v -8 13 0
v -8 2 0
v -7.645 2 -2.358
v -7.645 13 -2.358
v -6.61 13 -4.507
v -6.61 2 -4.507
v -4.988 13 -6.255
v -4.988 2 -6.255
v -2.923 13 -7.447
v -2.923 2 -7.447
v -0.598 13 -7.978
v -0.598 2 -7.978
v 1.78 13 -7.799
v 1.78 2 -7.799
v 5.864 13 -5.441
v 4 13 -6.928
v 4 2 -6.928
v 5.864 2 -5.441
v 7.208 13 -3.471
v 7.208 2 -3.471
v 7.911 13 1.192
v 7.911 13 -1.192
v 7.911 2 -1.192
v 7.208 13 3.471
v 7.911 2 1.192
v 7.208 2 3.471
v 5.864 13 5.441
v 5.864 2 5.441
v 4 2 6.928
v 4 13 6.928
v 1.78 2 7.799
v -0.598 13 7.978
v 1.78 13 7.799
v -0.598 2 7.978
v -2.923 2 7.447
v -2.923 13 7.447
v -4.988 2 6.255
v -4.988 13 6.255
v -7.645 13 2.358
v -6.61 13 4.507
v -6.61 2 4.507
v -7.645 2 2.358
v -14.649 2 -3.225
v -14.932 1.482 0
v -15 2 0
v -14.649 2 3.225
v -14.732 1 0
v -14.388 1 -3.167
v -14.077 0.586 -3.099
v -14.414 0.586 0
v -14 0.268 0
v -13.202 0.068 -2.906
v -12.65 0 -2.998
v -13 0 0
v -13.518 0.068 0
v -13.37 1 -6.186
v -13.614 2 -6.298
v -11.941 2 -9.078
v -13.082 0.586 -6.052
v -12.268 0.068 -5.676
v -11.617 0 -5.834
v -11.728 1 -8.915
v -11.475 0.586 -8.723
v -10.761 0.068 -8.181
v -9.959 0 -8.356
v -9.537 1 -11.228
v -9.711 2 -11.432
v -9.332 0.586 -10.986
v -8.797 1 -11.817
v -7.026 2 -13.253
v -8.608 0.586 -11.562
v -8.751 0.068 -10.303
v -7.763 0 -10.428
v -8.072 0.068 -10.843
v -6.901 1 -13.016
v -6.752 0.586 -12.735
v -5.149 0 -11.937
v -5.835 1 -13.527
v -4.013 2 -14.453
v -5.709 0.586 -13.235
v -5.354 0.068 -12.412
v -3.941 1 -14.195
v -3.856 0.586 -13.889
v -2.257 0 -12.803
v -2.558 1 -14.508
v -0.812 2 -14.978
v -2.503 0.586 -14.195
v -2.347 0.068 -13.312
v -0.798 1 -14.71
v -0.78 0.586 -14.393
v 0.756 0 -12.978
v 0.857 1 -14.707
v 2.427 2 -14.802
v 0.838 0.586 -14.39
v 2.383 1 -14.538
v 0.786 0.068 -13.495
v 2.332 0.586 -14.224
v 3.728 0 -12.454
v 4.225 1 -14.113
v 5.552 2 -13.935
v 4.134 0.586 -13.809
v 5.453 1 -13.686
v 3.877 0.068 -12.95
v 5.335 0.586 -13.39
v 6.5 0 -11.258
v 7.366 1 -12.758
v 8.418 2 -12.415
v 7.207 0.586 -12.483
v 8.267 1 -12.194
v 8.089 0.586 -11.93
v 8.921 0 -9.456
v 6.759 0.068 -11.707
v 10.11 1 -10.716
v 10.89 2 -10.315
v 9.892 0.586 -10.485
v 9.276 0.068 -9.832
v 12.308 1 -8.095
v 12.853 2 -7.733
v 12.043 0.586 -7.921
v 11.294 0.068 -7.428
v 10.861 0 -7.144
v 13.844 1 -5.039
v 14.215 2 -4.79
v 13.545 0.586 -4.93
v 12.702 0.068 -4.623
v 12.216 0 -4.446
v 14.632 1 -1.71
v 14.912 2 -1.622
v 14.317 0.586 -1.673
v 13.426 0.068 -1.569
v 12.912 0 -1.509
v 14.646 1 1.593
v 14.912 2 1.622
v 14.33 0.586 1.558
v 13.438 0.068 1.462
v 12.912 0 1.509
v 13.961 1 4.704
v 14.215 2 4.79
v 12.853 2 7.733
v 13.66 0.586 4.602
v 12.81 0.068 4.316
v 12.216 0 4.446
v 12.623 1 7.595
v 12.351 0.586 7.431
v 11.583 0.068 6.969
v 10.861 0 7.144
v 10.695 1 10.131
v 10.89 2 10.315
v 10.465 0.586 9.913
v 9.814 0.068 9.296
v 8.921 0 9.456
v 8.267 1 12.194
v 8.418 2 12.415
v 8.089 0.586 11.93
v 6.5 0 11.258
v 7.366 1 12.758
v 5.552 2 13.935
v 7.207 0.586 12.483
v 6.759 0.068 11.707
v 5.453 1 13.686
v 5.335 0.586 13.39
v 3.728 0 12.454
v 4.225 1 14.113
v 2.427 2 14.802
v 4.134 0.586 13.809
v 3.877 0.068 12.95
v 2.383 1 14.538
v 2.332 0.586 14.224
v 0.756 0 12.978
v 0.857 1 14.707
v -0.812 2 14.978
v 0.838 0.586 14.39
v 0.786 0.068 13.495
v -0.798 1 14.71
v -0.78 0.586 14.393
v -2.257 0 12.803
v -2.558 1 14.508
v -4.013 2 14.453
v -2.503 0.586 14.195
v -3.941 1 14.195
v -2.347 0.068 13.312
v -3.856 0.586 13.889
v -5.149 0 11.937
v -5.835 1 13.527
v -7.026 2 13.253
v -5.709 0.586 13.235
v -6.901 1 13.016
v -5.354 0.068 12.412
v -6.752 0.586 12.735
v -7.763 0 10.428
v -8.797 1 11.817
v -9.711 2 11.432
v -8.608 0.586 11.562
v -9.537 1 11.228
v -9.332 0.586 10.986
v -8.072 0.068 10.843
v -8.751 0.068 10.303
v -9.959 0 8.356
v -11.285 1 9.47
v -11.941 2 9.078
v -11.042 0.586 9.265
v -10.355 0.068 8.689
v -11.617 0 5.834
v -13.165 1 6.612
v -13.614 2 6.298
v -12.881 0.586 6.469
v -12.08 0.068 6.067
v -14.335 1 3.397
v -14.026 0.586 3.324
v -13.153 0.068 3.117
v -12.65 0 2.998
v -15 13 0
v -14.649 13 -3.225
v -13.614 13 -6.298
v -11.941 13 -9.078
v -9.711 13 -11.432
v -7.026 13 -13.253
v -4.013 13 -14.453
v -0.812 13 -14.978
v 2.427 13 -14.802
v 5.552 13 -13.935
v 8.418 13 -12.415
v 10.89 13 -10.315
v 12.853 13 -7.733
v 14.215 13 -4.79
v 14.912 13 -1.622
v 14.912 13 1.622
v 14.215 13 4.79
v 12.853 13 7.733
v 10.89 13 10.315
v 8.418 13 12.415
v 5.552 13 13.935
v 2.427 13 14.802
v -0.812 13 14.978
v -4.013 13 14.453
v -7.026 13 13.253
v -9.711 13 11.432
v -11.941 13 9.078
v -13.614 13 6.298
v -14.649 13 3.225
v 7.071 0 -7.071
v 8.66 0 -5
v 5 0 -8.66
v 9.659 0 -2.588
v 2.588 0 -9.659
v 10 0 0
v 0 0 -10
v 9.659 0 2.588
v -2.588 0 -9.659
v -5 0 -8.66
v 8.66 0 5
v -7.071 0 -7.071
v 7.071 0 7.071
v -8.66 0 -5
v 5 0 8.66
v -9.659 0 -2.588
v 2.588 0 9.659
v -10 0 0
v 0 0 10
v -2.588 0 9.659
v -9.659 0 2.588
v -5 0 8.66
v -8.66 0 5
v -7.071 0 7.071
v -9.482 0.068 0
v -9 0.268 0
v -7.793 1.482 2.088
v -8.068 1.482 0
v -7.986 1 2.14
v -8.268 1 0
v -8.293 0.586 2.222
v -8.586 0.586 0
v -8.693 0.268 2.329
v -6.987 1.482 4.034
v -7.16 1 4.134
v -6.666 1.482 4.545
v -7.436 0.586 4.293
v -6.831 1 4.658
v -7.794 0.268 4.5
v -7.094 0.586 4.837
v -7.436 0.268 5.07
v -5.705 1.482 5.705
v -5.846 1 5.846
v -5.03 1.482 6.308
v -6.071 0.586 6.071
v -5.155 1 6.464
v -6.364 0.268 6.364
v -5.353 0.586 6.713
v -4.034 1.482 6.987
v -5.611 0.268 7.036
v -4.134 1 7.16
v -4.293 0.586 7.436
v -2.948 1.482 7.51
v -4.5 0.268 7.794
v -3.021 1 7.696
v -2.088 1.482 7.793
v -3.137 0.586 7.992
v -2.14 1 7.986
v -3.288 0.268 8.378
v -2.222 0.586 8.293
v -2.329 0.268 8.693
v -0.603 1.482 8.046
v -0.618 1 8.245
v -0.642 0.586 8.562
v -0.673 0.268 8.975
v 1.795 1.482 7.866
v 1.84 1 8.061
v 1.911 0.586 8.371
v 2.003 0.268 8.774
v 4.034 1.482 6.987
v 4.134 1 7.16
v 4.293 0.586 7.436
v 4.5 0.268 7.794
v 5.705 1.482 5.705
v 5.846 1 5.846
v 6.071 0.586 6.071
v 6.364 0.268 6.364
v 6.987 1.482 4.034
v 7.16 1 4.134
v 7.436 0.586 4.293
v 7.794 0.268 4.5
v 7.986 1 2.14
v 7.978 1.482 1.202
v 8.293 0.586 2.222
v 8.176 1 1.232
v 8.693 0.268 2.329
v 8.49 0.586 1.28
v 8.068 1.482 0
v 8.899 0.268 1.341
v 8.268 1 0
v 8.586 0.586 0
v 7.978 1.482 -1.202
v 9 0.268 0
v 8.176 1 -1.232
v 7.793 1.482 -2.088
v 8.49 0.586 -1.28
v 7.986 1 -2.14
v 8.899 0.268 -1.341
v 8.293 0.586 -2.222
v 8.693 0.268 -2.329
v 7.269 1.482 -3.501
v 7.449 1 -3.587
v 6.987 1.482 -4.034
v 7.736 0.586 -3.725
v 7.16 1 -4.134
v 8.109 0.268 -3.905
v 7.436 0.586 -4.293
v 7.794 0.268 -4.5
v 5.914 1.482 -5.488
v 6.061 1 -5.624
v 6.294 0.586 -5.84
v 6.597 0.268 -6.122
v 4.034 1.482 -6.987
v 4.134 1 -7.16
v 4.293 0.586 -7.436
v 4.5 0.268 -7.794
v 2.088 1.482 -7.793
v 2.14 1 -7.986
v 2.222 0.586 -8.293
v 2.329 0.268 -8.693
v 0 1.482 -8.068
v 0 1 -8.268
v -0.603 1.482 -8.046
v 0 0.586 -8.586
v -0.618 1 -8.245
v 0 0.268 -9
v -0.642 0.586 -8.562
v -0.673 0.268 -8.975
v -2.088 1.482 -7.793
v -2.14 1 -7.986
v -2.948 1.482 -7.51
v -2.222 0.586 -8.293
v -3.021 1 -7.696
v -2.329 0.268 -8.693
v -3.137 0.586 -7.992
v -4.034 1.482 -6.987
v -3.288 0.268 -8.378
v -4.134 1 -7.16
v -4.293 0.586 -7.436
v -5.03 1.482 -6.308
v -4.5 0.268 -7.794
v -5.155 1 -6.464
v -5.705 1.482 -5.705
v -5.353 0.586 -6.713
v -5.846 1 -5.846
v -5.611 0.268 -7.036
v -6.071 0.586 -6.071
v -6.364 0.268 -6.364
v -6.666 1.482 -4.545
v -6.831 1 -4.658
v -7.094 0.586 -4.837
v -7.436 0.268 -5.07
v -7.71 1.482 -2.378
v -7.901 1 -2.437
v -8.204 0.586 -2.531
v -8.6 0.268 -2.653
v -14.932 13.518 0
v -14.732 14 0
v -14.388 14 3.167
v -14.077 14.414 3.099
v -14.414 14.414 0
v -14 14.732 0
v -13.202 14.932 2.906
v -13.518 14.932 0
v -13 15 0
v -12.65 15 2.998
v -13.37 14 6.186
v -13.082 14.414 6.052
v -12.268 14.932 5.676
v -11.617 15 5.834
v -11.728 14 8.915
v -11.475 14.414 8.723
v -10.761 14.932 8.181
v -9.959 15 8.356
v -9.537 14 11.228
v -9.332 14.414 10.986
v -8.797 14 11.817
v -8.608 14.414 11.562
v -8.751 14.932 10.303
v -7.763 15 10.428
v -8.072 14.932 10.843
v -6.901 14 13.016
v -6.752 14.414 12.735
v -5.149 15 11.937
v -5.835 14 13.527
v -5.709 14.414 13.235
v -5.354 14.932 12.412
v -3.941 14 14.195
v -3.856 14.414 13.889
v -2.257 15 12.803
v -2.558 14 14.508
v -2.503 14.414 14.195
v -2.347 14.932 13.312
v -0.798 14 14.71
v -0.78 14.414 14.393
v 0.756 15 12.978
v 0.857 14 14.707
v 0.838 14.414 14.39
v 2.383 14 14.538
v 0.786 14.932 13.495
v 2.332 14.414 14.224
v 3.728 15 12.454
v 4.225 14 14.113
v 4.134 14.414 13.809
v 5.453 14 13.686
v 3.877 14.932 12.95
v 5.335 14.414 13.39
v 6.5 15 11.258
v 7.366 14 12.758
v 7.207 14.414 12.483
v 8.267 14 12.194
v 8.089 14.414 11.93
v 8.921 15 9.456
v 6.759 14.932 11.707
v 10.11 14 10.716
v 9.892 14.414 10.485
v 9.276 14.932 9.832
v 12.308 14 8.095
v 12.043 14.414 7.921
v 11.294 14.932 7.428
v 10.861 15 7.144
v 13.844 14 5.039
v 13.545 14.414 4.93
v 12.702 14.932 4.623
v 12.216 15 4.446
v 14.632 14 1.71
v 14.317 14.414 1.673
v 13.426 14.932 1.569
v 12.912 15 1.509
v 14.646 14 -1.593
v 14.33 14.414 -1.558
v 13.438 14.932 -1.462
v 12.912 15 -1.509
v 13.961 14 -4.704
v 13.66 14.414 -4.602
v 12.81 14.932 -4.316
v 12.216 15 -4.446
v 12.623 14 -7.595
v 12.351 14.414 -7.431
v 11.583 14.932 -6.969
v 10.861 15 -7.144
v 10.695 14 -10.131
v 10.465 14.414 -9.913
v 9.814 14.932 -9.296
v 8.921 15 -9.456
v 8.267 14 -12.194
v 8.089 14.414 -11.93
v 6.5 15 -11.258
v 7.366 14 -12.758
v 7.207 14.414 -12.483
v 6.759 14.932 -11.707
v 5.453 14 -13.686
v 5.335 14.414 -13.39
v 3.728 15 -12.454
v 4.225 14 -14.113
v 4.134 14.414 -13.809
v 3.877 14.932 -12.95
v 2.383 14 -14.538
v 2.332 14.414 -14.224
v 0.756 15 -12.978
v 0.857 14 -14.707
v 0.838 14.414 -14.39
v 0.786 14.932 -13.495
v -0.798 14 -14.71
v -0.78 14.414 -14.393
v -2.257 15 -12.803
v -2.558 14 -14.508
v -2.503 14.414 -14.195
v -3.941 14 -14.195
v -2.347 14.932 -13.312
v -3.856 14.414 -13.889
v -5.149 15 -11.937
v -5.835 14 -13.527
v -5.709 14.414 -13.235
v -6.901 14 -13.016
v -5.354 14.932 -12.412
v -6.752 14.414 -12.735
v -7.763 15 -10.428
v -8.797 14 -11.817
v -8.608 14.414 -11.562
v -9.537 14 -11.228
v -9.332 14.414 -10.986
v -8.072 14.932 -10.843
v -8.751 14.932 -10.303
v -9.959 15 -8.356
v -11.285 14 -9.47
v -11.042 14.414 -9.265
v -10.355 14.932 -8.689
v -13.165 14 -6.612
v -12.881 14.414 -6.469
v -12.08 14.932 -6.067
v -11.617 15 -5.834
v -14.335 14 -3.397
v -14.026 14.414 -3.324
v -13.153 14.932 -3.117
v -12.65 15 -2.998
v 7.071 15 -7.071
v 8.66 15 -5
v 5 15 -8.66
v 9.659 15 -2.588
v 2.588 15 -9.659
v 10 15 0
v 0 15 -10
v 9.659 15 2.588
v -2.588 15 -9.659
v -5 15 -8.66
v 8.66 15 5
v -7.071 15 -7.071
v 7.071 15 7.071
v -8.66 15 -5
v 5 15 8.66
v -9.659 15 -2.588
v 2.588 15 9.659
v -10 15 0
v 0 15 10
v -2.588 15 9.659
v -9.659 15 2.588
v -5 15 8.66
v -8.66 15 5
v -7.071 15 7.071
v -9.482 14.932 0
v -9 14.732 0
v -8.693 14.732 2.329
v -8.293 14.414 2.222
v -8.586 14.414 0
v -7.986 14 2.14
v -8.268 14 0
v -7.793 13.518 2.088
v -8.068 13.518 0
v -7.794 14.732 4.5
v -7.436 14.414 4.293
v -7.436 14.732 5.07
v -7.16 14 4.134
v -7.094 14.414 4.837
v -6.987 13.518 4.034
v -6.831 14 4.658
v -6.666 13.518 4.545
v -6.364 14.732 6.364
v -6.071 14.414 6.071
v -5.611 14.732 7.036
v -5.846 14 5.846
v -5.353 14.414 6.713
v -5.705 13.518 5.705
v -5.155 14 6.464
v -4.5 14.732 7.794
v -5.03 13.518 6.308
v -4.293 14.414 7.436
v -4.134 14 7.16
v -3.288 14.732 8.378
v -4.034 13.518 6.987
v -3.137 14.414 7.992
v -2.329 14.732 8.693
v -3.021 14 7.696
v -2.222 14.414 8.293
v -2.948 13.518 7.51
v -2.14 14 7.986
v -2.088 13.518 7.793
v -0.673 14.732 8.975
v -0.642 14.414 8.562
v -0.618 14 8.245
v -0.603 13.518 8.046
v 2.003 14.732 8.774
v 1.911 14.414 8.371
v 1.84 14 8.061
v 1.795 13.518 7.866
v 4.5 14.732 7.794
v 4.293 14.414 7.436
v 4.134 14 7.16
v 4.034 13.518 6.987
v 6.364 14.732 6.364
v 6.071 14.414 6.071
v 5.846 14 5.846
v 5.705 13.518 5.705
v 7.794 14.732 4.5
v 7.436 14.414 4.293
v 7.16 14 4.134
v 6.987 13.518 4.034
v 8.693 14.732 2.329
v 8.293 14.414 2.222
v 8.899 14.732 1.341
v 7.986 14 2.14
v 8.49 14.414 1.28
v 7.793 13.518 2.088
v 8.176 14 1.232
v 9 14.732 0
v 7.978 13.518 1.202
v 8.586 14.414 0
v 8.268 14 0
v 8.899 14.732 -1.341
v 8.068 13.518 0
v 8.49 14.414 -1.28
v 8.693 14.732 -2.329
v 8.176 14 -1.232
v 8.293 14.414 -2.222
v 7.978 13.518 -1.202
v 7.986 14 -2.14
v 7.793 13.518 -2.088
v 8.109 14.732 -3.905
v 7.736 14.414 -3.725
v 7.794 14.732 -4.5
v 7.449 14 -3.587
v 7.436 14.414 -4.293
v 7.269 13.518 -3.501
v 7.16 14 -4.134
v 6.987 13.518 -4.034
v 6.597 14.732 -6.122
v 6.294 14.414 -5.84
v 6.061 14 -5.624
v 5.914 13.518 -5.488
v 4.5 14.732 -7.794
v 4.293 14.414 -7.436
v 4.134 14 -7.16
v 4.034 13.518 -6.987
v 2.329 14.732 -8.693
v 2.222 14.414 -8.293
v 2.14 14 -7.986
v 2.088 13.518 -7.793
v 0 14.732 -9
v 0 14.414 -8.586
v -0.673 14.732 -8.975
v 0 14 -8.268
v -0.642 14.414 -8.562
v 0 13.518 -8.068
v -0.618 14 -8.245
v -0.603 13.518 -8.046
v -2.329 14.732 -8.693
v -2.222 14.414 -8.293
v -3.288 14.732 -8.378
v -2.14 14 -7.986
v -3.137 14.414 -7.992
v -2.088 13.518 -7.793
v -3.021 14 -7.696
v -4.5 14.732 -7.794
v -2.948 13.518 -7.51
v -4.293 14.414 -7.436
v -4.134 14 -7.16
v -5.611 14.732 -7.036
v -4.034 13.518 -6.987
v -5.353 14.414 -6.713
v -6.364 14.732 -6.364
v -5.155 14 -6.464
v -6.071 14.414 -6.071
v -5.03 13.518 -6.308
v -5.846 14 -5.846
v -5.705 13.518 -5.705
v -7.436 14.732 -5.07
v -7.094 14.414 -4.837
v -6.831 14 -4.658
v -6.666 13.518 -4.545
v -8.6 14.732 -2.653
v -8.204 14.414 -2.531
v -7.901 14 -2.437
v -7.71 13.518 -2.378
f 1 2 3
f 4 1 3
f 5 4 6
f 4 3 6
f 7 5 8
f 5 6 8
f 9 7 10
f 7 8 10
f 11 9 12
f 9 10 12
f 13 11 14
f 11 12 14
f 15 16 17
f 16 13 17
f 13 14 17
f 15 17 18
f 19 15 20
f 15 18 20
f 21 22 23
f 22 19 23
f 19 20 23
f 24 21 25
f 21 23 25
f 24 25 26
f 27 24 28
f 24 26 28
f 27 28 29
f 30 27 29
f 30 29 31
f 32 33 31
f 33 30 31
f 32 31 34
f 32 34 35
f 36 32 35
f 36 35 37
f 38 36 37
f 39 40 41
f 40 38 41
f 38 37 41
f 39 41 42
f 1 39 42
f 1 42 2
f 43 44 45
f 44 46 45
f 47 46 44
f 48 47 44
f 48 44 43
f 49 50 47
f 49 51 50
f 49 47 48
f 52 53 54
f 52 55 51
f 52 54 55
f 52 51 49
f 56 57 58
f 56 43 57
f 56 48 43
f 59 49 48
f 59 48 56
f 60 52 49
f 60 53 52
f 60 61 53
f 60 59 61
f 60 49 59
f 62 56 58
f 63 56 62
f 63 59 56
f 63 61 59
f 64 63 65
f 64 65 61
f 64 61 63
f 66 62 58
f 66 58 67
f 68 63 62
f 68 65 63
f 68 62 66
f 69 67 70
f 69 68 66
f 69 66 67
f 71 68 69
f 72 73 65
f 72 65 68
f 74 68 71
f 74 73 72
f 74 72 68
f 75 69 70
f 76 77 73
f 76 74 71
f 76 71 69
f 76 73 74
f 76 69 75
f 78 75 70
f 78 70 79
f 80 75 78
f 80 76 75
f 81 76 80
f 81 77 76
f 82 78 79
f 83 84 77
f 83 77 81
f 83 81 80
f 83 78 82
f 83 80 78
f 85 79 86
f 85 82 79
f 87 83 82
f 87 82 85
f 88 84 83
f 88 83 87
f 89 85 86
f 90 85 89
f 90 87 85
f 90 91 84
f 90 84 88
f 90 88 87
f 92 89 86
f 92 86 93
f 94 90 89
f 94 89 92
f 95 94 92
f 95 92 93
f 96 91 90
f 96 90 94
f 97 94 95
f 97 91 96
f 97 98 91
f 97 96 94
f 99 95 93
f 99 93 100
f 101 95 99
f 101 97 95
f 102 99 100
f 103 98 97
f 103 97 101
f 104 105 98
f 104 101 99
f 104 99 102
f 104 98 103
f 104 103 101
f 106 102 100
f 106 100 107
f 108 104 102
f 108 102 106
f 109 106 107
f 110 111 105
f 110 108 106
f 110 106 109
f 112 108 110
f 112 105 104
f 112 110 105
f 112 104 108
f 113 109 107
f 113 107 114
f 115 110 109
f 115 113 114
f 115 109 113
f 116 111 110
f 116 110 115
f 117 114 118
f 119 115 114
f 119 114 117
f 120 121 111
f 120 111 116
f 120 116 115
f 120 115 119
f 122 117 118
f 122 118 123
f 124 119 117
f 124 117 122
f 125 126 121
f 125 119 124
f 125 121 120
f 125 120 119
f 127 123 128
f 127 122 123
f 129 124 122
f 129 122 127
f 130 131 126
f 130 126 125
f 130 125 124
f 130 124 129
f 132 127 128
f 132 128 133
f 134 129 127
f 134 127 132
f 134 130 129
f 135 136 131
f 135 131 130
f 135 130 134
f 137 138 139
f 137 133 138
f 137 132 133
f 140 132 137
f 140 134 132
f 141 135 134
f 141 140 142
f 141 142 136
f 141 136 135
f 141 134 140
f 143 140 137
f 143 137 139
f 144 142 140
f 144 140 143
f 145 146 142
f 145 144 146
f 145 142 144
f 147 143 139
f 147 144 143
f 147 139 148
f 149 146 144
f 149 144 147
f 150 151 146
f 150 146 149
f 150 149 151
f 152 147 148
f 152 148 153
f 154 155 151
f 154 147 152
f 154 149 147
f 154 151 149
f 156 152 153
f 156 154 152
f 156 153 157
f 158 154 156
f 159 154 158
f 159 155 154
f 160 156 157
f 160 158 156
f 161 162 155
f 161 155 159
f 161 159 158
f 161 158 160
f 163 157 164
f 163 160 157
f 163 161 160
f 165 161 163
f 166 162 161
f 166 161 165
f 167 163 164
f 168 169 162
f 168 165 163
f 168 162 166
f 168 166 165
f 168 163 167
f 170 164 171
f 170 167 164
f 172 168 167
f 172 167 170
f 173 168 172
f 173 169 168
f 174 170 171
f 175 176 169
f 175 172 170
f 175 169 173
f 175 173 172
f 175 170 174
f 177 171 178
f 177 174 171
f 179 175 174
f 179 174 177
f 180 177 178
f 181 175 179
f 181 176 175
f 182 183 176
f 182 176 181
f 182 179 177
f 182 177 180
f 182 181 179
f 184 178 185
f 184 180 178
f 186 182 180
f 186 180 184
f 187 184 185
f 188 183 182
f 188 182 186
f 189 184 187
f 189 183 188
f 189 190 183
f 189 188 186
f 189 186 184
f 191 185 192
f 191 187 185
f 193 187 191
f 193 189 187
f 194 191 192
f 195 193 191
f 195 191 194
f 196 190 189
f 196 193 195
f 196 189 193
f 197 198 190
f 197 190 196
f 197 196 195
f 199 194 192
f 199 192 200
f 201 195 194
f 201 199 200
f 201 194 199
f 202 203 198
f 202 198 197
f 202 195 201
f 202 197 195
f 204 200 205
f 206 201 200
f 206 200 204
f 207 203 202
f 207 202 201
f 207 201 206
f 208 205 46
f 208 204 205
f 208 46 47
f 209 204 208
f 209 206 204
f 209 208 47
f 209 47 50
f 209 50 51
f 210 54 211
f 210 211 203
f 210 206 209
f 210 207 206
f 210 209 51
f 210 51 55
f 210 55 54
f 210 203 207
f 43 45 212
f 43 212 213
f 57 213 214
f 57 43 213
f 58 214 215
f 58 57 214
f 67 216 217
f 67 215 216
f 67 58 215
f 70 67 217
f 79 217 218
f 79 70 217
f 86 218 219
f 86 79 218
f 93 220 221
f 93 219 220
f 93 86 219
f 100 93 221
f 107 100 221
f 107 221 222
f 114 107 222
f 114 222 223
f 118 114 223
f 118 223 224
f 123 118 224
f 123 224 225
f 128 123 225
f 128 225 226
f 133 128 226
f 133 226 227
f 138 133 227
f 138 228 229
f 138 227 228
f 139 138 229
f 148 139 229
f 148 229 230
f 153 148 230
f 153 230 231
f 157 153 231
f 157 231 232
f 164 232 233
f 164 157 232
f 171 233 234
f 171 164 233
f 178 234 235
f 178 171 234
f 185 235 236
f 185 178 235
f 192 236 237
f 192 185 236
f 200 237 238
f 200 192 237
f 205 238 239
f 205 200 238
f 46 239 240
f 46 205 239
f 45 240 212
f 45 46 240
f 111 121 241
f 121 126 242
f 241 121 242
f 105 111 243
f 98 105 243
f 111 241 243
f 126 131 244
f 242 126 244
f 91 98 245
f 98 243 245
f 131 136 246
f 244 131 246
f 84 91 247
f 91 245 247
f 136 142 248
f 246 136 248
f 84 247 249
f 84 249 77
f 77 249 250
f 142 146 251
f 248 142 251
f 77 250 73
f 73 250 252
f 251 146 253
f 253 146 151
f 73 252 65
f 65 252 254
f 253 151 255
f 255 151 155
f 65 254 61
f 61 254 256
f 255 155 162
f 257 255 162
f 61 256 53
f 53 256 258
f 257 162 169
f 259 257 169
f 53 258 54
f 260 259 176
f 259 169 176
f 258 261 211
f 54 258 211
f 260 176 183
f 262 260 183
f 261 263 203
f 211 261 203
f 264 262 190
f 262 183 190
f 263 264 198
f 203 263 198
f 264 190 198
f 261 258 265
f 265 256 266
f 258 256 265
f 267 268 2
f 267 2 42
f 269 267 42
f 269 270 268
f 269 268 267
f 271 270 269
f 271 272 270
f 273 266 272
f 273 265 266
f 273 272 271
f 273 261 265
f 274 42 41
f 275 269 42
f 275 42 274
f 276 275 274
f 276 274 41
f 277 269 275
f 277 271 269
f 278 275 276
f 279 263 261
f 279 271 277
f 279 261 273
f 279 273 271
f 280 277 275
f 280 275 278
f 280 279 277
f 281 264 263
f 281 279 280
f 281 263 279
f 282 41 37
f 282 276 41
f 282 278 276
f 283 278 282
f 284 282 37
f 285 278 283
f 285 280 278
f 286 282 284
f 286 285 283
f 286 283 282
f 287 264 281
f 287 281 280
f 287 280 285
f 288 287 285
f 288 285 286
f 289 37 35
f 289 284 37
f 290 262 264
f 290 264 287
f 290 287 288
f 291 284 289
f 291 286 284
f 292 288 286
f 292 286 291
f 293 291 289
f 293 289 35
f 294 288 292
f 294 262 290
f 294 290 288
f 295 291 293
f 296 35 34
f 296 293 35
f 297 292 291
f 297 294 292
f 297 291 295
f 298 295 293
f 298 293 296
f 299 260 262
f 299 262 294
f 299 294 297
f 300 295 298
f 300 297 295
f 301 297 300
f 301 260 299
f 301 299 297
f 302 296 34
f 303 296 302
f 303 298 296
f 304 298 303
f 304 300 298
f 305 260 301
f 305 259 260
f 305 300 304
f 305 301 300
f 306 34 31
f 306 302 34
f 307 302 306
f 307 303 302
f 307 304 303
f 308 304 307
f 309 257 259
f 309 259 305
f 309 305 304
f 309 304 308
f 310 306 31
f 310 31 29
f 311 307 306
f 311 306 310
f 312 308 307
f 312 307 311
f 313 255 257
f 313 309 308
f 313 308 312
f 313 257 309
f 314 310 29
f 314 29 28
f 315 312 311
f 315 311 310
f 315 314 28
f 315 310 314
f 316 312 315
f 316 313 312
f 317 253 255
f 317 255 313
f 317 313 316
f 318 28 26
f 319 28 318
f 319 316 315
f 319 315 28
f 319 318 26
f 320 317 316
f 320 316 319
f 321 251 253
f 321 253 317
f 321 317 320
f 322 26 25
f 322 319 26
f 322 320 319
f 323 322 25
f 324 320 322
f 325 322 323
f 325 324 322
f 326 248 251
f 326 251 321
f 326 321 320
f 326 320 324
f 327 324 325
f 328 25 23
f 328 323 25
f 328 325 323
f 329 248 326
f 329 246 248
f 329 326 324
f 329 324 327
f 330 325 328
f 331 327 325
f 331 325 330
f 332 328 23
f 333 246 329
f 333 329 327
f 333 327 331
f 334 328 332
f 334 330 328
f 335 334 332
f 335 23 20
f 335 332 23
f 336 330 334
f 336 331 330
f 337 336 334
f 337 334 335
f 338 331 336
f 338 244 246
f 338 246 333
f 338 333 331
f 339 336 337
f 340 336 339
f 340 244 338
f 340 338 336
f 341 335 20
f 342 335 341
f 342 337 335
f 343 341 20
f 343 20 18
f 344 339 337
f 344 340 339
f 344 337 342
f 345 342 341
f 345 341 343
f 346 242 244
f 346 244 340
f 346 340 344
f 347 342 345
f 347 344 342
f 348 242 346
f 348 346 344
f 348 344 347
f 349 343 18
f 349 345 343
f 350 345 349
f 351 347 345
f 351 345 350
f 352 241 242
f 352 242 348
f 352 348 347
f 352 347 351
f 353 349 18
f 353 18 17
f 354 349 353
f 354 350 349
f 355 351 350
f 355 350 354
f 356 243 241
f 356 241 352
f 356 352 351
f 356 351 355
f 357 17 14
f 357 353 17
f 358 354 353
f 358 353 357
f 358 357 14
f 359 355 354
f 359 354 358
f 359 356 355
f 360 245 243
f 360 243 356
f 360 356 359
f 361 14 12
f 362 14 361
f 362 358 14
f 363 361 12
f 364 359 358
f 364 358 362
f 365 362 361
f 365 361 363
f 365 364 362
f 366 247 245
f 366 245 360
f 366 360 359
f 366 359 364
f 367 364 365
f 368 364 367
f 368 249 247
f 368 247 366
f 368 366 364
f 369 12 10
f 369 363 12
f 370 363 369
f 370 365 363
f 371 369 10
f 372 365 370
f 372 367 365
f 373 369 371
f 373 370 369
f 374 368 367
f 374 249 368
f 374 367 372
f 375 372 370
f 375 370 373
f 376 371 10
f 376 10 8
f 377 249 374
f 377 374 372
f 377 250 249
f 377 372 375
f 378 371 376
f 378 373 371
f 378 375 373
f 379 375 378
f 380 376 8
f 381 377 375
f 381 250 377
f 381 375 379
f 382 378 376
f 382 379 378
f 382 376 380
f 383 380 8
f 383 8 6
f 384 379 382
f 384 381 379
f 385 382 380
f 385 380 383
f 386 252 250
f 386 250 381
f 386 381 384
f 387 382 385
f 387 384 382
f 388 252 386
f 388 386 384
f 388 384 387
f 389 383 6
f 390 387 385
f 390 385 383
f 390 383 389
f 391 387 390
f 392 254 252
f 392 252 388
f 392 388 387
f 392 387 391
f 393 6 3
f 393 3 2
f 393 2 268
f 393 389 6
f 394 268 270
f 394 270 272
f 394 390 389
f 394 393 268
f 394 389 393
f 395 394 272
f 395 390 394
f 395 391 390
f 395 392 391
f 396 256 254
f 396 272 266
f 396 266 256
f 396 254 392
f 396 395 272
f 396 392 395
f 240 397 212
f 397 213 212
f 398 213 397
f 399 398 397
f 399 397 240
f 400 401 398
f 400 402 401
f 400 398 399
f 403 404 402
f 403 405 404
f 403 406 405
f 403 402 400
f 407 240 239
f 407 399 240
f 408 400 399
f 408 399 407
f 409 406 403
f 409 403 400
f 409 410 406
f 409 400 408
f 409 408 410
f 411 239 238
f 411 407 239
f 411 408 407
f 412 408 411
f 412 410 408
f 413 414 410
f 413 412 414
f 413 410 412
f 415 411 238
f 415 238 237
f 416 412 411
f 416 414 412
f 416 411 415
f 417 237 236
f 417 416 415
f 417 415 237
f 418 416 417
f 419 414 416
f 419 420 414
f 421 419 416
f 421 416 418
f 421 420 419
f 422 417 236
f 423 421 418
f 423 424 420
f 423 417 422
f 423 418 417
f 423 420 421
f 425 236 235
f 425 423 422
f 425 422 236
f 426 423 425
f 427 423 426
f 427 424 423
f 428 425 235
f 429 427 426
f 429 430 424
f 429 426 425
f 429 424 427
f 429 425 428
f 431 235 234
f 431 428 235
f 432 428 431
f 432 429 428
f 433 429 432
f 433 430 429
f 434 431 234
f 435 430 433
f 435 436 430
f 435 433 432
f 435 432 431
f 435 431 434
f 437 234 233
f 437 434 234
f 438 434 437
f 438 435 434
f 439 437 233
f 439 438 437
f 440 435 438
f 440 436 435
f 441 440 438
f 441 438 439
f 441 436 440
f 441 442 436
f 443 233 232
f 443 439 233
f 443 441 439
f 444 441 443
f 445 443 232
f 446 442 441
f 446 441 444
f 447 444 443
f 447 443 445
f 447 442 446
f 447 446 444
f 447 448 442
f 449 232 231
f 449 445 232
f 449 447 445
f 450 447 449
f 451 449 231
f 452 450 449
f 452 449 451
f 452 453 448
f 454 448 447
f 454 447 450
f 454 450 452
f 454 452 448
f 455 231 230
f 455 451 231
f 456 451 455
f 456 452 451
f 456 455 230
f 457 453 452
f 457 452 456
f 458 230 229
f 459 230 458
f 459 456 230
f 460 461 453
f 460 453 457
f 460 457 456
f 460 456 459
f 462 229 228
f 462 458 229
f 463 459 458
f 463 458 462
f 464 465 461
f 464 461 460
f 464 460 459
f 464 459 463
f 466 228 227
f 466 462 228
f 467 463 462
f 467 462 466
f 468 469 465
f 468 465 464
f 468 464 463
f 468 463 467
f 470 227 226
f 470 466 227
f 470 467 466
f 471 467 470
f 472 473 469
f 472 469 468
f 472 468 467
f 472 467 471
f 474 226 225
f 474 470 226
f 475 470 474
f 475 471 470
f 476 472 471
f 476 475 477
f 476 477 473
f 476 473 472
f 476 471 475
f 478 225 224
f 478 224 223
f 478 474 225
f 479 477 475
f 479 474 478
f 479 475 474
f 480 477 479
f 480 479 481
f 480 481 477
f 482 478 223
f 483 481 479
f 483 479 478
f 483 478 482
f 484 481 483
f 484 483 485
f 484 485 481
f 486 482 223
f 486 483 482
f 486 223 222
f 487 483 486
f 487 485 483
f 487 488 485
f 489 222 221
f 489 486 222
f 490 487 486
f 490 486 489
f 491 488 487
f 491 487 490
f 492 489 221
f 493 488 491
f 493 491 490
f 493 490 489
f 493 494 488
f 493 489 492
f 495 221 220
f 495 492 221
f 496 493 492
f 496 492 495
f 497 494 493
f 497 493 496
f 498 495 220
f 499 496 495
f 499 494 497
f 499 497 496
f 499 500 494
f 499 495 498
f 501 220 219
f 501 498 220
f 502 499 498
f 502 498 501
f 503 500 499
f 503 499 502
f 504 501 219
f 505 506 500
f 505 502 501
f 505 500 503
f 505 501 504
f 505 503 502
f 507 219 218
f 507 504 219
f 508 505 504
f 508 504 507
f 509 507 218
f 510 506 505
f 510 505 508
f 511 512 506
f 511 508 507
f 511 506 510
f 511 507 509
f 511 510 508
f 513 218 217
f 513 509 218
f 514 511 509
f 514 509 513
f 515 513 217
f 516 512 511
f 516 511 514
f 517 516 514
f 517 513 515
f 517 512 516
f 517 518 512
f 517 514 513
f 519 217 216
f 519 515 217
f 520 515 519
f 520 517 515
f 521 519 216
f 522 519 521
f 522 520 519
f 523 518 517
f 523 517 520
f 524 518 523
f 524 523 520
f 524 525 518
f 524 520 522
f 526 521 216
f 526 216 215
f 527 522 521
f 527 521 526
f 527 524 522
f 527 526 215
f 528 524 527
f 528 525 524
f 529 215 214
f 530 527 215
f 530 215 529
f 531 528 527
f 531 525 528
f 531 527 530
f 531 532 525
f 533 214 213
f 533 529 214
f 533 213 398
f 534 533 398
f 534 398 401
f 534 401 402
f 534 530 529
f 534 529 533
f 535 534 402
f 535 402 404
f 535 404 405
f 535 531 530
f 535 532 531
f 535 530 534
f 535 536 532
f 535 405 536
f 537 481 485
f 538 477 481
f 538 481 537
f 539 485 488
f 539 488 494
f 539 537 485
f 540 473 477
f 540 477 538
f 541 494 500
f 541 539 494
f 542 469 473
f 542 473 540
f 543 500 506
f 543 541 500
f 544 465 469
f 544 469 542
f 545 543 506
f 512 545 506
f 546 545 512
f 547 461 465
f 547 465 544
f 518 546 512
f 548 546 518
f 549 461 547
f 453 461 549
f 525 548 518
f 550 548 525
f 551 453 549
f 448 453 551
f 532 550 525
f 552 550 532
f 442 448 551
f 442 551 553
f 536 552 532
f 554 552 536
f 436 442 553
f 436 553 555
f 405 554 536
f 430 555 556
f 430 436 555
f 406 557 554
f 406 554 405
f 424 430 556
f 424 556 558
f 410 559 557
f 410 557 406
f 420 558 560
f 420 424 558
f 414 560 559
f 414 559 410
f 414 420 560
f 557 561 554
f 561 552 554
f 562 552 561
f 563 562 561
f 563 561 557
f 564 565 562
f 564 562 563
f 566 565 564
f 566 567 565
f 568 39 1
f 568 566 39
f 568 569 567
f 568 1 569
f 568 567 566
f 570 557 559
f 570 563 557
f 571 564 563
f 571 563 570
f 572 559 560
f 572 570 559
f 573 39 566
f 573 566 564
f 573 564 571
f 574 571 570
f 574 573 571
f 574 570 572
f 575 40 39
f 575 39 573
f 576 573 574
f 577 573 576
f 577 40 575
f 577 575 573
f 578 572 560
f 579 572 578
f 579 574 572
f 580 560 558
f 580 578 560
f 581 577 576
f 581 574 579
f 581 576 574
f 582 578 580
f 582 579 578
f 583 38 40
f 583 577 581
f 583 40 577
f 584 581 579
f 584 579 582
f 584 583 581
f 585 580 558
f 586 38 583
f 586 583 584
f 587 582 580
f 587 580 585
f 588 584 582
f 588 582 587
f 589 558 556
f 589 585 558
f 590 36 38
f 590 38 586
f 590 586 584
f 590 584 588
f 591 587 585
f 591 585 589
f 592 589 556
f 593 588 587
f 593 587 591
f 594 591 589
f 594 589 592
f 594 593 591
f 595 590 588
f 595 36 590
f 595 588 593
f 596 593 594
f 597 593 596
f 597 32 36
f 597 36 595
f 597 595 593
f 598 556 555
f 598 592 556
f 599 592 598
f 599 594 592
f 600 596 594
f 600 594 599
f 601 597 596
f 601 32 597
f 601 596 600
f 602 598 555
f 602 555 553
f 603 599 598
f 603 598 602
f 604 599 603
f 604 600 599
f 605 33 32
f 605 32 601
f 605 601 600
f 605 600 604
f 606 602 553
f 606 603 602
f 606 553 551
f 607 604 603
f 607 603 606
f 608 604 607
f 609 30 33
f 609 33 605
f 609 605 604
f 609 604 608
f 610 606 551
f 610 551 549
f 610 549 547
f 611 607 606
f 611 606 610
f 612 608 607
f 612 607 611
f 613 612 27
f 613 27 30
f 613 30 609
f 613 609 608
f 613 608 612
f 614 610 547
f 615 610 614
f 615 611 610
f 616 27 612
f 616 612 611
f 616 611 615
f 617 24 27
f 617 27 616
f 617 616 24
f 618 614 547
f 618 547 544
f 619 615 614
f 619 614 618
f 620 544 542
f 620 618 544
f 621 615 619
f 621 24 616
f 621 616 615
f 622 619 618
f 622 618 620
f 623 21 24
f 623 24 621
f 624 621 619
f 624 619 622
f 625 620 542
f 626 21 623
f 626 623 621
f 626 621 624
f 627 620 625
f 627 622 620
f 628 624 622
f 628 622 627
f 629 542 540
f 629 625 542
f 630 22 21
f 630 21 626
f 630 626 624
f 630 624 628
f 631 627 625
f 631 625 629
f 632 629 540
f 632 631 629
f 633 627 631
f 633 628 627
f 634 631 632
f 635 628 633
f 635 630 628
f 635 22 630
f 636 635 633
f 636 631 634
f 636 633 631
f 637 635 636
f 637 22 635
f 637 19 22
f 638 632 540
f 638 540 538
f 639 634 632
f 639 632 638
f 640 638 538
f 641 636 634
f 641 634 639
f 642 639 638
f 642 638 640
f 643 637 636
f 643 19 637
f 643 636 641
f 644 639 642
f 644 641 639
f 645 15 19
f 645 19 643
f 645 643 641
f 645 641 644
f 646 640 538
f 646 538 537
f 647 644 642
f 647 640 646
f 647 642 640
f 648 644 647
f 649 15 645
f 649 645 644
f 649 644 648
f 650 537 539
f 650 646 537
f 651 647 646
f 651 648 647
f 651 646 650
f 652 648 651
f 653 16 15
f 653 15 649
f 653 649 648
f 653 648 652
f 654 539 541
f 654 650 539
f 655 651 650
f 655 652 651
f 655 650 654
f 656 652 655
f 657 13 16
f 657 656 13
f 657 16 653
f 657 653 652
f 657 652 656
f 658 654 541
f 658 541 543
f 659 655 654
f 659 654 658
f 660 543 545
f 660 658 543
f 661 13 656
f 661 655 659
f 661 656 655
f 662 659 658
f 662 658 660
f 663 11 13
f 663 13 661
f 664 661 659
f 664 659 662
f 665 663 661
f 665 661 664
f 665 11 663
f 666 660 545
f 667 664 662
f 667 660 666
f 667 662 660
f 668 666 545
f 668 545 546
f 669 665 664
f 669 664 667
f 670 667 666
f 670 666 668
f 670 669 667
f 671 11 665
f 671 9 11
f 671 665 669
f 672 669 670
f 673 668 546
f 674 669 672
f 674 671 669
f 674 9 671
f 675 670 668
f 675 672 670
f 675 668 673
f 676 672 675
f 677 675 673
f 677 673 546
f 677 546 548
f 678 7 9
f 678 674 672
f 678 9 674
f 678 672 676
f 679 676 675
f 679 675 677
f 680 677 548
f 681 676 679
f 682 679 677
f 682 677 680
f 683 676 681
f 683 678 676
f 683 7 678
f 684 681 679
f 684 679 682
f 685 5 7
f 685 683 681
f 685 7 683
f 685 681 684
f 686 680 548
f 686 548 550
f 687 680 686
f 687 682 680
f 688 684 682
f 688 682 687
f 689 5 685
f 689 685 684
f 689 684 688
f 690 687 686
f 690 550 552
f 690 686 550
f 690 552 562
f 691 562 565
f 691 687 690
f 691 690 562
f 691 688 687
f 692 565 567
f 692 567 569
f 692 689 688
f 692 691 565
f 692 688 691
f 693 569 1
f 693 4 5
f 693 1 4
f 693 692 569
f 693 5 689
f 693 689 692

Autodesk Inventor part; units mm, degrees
ref_plane "YZ Plane" through (0, 0, 0) normal (1, 0, 0) x (0, 1, 0)
ref_plane "XZ Plane" through (0, 0, 0) normal (0, 1, 0) x (-1, 0, 0)
ref_plane "XY Plane" through (0, 0, 0) normal (0, 0, 1) x (1, 0, 0)
sketch "Sketch1" plane through (0, 0, 0) normal (0, 1, 0) x (-1, 0, 0)
  point P0 (0, 0)
sketch "Sketch2" plane through (0, 0, 0) normal (0, 1, 0) x (-1, 0, 0)
  circle A0 centre (0, 0) radius 8
  circle A1 centre (0, 0) radius 15
  dimension "d0" = 16
  dimension "d1" = 30
extrude "Extrusion1" add sketch "Sketch2" along normal blind 15
fillet "Fillet1" radius 2 1 edges at (15, 15, 0)
fillet "Fillet2" radius 2 1 edges at (8, 15, 0)
fillet "Fillet3" radius 2 2 edges at (15, 0, 0) (8, 0, 0)
properties part number "coil"
